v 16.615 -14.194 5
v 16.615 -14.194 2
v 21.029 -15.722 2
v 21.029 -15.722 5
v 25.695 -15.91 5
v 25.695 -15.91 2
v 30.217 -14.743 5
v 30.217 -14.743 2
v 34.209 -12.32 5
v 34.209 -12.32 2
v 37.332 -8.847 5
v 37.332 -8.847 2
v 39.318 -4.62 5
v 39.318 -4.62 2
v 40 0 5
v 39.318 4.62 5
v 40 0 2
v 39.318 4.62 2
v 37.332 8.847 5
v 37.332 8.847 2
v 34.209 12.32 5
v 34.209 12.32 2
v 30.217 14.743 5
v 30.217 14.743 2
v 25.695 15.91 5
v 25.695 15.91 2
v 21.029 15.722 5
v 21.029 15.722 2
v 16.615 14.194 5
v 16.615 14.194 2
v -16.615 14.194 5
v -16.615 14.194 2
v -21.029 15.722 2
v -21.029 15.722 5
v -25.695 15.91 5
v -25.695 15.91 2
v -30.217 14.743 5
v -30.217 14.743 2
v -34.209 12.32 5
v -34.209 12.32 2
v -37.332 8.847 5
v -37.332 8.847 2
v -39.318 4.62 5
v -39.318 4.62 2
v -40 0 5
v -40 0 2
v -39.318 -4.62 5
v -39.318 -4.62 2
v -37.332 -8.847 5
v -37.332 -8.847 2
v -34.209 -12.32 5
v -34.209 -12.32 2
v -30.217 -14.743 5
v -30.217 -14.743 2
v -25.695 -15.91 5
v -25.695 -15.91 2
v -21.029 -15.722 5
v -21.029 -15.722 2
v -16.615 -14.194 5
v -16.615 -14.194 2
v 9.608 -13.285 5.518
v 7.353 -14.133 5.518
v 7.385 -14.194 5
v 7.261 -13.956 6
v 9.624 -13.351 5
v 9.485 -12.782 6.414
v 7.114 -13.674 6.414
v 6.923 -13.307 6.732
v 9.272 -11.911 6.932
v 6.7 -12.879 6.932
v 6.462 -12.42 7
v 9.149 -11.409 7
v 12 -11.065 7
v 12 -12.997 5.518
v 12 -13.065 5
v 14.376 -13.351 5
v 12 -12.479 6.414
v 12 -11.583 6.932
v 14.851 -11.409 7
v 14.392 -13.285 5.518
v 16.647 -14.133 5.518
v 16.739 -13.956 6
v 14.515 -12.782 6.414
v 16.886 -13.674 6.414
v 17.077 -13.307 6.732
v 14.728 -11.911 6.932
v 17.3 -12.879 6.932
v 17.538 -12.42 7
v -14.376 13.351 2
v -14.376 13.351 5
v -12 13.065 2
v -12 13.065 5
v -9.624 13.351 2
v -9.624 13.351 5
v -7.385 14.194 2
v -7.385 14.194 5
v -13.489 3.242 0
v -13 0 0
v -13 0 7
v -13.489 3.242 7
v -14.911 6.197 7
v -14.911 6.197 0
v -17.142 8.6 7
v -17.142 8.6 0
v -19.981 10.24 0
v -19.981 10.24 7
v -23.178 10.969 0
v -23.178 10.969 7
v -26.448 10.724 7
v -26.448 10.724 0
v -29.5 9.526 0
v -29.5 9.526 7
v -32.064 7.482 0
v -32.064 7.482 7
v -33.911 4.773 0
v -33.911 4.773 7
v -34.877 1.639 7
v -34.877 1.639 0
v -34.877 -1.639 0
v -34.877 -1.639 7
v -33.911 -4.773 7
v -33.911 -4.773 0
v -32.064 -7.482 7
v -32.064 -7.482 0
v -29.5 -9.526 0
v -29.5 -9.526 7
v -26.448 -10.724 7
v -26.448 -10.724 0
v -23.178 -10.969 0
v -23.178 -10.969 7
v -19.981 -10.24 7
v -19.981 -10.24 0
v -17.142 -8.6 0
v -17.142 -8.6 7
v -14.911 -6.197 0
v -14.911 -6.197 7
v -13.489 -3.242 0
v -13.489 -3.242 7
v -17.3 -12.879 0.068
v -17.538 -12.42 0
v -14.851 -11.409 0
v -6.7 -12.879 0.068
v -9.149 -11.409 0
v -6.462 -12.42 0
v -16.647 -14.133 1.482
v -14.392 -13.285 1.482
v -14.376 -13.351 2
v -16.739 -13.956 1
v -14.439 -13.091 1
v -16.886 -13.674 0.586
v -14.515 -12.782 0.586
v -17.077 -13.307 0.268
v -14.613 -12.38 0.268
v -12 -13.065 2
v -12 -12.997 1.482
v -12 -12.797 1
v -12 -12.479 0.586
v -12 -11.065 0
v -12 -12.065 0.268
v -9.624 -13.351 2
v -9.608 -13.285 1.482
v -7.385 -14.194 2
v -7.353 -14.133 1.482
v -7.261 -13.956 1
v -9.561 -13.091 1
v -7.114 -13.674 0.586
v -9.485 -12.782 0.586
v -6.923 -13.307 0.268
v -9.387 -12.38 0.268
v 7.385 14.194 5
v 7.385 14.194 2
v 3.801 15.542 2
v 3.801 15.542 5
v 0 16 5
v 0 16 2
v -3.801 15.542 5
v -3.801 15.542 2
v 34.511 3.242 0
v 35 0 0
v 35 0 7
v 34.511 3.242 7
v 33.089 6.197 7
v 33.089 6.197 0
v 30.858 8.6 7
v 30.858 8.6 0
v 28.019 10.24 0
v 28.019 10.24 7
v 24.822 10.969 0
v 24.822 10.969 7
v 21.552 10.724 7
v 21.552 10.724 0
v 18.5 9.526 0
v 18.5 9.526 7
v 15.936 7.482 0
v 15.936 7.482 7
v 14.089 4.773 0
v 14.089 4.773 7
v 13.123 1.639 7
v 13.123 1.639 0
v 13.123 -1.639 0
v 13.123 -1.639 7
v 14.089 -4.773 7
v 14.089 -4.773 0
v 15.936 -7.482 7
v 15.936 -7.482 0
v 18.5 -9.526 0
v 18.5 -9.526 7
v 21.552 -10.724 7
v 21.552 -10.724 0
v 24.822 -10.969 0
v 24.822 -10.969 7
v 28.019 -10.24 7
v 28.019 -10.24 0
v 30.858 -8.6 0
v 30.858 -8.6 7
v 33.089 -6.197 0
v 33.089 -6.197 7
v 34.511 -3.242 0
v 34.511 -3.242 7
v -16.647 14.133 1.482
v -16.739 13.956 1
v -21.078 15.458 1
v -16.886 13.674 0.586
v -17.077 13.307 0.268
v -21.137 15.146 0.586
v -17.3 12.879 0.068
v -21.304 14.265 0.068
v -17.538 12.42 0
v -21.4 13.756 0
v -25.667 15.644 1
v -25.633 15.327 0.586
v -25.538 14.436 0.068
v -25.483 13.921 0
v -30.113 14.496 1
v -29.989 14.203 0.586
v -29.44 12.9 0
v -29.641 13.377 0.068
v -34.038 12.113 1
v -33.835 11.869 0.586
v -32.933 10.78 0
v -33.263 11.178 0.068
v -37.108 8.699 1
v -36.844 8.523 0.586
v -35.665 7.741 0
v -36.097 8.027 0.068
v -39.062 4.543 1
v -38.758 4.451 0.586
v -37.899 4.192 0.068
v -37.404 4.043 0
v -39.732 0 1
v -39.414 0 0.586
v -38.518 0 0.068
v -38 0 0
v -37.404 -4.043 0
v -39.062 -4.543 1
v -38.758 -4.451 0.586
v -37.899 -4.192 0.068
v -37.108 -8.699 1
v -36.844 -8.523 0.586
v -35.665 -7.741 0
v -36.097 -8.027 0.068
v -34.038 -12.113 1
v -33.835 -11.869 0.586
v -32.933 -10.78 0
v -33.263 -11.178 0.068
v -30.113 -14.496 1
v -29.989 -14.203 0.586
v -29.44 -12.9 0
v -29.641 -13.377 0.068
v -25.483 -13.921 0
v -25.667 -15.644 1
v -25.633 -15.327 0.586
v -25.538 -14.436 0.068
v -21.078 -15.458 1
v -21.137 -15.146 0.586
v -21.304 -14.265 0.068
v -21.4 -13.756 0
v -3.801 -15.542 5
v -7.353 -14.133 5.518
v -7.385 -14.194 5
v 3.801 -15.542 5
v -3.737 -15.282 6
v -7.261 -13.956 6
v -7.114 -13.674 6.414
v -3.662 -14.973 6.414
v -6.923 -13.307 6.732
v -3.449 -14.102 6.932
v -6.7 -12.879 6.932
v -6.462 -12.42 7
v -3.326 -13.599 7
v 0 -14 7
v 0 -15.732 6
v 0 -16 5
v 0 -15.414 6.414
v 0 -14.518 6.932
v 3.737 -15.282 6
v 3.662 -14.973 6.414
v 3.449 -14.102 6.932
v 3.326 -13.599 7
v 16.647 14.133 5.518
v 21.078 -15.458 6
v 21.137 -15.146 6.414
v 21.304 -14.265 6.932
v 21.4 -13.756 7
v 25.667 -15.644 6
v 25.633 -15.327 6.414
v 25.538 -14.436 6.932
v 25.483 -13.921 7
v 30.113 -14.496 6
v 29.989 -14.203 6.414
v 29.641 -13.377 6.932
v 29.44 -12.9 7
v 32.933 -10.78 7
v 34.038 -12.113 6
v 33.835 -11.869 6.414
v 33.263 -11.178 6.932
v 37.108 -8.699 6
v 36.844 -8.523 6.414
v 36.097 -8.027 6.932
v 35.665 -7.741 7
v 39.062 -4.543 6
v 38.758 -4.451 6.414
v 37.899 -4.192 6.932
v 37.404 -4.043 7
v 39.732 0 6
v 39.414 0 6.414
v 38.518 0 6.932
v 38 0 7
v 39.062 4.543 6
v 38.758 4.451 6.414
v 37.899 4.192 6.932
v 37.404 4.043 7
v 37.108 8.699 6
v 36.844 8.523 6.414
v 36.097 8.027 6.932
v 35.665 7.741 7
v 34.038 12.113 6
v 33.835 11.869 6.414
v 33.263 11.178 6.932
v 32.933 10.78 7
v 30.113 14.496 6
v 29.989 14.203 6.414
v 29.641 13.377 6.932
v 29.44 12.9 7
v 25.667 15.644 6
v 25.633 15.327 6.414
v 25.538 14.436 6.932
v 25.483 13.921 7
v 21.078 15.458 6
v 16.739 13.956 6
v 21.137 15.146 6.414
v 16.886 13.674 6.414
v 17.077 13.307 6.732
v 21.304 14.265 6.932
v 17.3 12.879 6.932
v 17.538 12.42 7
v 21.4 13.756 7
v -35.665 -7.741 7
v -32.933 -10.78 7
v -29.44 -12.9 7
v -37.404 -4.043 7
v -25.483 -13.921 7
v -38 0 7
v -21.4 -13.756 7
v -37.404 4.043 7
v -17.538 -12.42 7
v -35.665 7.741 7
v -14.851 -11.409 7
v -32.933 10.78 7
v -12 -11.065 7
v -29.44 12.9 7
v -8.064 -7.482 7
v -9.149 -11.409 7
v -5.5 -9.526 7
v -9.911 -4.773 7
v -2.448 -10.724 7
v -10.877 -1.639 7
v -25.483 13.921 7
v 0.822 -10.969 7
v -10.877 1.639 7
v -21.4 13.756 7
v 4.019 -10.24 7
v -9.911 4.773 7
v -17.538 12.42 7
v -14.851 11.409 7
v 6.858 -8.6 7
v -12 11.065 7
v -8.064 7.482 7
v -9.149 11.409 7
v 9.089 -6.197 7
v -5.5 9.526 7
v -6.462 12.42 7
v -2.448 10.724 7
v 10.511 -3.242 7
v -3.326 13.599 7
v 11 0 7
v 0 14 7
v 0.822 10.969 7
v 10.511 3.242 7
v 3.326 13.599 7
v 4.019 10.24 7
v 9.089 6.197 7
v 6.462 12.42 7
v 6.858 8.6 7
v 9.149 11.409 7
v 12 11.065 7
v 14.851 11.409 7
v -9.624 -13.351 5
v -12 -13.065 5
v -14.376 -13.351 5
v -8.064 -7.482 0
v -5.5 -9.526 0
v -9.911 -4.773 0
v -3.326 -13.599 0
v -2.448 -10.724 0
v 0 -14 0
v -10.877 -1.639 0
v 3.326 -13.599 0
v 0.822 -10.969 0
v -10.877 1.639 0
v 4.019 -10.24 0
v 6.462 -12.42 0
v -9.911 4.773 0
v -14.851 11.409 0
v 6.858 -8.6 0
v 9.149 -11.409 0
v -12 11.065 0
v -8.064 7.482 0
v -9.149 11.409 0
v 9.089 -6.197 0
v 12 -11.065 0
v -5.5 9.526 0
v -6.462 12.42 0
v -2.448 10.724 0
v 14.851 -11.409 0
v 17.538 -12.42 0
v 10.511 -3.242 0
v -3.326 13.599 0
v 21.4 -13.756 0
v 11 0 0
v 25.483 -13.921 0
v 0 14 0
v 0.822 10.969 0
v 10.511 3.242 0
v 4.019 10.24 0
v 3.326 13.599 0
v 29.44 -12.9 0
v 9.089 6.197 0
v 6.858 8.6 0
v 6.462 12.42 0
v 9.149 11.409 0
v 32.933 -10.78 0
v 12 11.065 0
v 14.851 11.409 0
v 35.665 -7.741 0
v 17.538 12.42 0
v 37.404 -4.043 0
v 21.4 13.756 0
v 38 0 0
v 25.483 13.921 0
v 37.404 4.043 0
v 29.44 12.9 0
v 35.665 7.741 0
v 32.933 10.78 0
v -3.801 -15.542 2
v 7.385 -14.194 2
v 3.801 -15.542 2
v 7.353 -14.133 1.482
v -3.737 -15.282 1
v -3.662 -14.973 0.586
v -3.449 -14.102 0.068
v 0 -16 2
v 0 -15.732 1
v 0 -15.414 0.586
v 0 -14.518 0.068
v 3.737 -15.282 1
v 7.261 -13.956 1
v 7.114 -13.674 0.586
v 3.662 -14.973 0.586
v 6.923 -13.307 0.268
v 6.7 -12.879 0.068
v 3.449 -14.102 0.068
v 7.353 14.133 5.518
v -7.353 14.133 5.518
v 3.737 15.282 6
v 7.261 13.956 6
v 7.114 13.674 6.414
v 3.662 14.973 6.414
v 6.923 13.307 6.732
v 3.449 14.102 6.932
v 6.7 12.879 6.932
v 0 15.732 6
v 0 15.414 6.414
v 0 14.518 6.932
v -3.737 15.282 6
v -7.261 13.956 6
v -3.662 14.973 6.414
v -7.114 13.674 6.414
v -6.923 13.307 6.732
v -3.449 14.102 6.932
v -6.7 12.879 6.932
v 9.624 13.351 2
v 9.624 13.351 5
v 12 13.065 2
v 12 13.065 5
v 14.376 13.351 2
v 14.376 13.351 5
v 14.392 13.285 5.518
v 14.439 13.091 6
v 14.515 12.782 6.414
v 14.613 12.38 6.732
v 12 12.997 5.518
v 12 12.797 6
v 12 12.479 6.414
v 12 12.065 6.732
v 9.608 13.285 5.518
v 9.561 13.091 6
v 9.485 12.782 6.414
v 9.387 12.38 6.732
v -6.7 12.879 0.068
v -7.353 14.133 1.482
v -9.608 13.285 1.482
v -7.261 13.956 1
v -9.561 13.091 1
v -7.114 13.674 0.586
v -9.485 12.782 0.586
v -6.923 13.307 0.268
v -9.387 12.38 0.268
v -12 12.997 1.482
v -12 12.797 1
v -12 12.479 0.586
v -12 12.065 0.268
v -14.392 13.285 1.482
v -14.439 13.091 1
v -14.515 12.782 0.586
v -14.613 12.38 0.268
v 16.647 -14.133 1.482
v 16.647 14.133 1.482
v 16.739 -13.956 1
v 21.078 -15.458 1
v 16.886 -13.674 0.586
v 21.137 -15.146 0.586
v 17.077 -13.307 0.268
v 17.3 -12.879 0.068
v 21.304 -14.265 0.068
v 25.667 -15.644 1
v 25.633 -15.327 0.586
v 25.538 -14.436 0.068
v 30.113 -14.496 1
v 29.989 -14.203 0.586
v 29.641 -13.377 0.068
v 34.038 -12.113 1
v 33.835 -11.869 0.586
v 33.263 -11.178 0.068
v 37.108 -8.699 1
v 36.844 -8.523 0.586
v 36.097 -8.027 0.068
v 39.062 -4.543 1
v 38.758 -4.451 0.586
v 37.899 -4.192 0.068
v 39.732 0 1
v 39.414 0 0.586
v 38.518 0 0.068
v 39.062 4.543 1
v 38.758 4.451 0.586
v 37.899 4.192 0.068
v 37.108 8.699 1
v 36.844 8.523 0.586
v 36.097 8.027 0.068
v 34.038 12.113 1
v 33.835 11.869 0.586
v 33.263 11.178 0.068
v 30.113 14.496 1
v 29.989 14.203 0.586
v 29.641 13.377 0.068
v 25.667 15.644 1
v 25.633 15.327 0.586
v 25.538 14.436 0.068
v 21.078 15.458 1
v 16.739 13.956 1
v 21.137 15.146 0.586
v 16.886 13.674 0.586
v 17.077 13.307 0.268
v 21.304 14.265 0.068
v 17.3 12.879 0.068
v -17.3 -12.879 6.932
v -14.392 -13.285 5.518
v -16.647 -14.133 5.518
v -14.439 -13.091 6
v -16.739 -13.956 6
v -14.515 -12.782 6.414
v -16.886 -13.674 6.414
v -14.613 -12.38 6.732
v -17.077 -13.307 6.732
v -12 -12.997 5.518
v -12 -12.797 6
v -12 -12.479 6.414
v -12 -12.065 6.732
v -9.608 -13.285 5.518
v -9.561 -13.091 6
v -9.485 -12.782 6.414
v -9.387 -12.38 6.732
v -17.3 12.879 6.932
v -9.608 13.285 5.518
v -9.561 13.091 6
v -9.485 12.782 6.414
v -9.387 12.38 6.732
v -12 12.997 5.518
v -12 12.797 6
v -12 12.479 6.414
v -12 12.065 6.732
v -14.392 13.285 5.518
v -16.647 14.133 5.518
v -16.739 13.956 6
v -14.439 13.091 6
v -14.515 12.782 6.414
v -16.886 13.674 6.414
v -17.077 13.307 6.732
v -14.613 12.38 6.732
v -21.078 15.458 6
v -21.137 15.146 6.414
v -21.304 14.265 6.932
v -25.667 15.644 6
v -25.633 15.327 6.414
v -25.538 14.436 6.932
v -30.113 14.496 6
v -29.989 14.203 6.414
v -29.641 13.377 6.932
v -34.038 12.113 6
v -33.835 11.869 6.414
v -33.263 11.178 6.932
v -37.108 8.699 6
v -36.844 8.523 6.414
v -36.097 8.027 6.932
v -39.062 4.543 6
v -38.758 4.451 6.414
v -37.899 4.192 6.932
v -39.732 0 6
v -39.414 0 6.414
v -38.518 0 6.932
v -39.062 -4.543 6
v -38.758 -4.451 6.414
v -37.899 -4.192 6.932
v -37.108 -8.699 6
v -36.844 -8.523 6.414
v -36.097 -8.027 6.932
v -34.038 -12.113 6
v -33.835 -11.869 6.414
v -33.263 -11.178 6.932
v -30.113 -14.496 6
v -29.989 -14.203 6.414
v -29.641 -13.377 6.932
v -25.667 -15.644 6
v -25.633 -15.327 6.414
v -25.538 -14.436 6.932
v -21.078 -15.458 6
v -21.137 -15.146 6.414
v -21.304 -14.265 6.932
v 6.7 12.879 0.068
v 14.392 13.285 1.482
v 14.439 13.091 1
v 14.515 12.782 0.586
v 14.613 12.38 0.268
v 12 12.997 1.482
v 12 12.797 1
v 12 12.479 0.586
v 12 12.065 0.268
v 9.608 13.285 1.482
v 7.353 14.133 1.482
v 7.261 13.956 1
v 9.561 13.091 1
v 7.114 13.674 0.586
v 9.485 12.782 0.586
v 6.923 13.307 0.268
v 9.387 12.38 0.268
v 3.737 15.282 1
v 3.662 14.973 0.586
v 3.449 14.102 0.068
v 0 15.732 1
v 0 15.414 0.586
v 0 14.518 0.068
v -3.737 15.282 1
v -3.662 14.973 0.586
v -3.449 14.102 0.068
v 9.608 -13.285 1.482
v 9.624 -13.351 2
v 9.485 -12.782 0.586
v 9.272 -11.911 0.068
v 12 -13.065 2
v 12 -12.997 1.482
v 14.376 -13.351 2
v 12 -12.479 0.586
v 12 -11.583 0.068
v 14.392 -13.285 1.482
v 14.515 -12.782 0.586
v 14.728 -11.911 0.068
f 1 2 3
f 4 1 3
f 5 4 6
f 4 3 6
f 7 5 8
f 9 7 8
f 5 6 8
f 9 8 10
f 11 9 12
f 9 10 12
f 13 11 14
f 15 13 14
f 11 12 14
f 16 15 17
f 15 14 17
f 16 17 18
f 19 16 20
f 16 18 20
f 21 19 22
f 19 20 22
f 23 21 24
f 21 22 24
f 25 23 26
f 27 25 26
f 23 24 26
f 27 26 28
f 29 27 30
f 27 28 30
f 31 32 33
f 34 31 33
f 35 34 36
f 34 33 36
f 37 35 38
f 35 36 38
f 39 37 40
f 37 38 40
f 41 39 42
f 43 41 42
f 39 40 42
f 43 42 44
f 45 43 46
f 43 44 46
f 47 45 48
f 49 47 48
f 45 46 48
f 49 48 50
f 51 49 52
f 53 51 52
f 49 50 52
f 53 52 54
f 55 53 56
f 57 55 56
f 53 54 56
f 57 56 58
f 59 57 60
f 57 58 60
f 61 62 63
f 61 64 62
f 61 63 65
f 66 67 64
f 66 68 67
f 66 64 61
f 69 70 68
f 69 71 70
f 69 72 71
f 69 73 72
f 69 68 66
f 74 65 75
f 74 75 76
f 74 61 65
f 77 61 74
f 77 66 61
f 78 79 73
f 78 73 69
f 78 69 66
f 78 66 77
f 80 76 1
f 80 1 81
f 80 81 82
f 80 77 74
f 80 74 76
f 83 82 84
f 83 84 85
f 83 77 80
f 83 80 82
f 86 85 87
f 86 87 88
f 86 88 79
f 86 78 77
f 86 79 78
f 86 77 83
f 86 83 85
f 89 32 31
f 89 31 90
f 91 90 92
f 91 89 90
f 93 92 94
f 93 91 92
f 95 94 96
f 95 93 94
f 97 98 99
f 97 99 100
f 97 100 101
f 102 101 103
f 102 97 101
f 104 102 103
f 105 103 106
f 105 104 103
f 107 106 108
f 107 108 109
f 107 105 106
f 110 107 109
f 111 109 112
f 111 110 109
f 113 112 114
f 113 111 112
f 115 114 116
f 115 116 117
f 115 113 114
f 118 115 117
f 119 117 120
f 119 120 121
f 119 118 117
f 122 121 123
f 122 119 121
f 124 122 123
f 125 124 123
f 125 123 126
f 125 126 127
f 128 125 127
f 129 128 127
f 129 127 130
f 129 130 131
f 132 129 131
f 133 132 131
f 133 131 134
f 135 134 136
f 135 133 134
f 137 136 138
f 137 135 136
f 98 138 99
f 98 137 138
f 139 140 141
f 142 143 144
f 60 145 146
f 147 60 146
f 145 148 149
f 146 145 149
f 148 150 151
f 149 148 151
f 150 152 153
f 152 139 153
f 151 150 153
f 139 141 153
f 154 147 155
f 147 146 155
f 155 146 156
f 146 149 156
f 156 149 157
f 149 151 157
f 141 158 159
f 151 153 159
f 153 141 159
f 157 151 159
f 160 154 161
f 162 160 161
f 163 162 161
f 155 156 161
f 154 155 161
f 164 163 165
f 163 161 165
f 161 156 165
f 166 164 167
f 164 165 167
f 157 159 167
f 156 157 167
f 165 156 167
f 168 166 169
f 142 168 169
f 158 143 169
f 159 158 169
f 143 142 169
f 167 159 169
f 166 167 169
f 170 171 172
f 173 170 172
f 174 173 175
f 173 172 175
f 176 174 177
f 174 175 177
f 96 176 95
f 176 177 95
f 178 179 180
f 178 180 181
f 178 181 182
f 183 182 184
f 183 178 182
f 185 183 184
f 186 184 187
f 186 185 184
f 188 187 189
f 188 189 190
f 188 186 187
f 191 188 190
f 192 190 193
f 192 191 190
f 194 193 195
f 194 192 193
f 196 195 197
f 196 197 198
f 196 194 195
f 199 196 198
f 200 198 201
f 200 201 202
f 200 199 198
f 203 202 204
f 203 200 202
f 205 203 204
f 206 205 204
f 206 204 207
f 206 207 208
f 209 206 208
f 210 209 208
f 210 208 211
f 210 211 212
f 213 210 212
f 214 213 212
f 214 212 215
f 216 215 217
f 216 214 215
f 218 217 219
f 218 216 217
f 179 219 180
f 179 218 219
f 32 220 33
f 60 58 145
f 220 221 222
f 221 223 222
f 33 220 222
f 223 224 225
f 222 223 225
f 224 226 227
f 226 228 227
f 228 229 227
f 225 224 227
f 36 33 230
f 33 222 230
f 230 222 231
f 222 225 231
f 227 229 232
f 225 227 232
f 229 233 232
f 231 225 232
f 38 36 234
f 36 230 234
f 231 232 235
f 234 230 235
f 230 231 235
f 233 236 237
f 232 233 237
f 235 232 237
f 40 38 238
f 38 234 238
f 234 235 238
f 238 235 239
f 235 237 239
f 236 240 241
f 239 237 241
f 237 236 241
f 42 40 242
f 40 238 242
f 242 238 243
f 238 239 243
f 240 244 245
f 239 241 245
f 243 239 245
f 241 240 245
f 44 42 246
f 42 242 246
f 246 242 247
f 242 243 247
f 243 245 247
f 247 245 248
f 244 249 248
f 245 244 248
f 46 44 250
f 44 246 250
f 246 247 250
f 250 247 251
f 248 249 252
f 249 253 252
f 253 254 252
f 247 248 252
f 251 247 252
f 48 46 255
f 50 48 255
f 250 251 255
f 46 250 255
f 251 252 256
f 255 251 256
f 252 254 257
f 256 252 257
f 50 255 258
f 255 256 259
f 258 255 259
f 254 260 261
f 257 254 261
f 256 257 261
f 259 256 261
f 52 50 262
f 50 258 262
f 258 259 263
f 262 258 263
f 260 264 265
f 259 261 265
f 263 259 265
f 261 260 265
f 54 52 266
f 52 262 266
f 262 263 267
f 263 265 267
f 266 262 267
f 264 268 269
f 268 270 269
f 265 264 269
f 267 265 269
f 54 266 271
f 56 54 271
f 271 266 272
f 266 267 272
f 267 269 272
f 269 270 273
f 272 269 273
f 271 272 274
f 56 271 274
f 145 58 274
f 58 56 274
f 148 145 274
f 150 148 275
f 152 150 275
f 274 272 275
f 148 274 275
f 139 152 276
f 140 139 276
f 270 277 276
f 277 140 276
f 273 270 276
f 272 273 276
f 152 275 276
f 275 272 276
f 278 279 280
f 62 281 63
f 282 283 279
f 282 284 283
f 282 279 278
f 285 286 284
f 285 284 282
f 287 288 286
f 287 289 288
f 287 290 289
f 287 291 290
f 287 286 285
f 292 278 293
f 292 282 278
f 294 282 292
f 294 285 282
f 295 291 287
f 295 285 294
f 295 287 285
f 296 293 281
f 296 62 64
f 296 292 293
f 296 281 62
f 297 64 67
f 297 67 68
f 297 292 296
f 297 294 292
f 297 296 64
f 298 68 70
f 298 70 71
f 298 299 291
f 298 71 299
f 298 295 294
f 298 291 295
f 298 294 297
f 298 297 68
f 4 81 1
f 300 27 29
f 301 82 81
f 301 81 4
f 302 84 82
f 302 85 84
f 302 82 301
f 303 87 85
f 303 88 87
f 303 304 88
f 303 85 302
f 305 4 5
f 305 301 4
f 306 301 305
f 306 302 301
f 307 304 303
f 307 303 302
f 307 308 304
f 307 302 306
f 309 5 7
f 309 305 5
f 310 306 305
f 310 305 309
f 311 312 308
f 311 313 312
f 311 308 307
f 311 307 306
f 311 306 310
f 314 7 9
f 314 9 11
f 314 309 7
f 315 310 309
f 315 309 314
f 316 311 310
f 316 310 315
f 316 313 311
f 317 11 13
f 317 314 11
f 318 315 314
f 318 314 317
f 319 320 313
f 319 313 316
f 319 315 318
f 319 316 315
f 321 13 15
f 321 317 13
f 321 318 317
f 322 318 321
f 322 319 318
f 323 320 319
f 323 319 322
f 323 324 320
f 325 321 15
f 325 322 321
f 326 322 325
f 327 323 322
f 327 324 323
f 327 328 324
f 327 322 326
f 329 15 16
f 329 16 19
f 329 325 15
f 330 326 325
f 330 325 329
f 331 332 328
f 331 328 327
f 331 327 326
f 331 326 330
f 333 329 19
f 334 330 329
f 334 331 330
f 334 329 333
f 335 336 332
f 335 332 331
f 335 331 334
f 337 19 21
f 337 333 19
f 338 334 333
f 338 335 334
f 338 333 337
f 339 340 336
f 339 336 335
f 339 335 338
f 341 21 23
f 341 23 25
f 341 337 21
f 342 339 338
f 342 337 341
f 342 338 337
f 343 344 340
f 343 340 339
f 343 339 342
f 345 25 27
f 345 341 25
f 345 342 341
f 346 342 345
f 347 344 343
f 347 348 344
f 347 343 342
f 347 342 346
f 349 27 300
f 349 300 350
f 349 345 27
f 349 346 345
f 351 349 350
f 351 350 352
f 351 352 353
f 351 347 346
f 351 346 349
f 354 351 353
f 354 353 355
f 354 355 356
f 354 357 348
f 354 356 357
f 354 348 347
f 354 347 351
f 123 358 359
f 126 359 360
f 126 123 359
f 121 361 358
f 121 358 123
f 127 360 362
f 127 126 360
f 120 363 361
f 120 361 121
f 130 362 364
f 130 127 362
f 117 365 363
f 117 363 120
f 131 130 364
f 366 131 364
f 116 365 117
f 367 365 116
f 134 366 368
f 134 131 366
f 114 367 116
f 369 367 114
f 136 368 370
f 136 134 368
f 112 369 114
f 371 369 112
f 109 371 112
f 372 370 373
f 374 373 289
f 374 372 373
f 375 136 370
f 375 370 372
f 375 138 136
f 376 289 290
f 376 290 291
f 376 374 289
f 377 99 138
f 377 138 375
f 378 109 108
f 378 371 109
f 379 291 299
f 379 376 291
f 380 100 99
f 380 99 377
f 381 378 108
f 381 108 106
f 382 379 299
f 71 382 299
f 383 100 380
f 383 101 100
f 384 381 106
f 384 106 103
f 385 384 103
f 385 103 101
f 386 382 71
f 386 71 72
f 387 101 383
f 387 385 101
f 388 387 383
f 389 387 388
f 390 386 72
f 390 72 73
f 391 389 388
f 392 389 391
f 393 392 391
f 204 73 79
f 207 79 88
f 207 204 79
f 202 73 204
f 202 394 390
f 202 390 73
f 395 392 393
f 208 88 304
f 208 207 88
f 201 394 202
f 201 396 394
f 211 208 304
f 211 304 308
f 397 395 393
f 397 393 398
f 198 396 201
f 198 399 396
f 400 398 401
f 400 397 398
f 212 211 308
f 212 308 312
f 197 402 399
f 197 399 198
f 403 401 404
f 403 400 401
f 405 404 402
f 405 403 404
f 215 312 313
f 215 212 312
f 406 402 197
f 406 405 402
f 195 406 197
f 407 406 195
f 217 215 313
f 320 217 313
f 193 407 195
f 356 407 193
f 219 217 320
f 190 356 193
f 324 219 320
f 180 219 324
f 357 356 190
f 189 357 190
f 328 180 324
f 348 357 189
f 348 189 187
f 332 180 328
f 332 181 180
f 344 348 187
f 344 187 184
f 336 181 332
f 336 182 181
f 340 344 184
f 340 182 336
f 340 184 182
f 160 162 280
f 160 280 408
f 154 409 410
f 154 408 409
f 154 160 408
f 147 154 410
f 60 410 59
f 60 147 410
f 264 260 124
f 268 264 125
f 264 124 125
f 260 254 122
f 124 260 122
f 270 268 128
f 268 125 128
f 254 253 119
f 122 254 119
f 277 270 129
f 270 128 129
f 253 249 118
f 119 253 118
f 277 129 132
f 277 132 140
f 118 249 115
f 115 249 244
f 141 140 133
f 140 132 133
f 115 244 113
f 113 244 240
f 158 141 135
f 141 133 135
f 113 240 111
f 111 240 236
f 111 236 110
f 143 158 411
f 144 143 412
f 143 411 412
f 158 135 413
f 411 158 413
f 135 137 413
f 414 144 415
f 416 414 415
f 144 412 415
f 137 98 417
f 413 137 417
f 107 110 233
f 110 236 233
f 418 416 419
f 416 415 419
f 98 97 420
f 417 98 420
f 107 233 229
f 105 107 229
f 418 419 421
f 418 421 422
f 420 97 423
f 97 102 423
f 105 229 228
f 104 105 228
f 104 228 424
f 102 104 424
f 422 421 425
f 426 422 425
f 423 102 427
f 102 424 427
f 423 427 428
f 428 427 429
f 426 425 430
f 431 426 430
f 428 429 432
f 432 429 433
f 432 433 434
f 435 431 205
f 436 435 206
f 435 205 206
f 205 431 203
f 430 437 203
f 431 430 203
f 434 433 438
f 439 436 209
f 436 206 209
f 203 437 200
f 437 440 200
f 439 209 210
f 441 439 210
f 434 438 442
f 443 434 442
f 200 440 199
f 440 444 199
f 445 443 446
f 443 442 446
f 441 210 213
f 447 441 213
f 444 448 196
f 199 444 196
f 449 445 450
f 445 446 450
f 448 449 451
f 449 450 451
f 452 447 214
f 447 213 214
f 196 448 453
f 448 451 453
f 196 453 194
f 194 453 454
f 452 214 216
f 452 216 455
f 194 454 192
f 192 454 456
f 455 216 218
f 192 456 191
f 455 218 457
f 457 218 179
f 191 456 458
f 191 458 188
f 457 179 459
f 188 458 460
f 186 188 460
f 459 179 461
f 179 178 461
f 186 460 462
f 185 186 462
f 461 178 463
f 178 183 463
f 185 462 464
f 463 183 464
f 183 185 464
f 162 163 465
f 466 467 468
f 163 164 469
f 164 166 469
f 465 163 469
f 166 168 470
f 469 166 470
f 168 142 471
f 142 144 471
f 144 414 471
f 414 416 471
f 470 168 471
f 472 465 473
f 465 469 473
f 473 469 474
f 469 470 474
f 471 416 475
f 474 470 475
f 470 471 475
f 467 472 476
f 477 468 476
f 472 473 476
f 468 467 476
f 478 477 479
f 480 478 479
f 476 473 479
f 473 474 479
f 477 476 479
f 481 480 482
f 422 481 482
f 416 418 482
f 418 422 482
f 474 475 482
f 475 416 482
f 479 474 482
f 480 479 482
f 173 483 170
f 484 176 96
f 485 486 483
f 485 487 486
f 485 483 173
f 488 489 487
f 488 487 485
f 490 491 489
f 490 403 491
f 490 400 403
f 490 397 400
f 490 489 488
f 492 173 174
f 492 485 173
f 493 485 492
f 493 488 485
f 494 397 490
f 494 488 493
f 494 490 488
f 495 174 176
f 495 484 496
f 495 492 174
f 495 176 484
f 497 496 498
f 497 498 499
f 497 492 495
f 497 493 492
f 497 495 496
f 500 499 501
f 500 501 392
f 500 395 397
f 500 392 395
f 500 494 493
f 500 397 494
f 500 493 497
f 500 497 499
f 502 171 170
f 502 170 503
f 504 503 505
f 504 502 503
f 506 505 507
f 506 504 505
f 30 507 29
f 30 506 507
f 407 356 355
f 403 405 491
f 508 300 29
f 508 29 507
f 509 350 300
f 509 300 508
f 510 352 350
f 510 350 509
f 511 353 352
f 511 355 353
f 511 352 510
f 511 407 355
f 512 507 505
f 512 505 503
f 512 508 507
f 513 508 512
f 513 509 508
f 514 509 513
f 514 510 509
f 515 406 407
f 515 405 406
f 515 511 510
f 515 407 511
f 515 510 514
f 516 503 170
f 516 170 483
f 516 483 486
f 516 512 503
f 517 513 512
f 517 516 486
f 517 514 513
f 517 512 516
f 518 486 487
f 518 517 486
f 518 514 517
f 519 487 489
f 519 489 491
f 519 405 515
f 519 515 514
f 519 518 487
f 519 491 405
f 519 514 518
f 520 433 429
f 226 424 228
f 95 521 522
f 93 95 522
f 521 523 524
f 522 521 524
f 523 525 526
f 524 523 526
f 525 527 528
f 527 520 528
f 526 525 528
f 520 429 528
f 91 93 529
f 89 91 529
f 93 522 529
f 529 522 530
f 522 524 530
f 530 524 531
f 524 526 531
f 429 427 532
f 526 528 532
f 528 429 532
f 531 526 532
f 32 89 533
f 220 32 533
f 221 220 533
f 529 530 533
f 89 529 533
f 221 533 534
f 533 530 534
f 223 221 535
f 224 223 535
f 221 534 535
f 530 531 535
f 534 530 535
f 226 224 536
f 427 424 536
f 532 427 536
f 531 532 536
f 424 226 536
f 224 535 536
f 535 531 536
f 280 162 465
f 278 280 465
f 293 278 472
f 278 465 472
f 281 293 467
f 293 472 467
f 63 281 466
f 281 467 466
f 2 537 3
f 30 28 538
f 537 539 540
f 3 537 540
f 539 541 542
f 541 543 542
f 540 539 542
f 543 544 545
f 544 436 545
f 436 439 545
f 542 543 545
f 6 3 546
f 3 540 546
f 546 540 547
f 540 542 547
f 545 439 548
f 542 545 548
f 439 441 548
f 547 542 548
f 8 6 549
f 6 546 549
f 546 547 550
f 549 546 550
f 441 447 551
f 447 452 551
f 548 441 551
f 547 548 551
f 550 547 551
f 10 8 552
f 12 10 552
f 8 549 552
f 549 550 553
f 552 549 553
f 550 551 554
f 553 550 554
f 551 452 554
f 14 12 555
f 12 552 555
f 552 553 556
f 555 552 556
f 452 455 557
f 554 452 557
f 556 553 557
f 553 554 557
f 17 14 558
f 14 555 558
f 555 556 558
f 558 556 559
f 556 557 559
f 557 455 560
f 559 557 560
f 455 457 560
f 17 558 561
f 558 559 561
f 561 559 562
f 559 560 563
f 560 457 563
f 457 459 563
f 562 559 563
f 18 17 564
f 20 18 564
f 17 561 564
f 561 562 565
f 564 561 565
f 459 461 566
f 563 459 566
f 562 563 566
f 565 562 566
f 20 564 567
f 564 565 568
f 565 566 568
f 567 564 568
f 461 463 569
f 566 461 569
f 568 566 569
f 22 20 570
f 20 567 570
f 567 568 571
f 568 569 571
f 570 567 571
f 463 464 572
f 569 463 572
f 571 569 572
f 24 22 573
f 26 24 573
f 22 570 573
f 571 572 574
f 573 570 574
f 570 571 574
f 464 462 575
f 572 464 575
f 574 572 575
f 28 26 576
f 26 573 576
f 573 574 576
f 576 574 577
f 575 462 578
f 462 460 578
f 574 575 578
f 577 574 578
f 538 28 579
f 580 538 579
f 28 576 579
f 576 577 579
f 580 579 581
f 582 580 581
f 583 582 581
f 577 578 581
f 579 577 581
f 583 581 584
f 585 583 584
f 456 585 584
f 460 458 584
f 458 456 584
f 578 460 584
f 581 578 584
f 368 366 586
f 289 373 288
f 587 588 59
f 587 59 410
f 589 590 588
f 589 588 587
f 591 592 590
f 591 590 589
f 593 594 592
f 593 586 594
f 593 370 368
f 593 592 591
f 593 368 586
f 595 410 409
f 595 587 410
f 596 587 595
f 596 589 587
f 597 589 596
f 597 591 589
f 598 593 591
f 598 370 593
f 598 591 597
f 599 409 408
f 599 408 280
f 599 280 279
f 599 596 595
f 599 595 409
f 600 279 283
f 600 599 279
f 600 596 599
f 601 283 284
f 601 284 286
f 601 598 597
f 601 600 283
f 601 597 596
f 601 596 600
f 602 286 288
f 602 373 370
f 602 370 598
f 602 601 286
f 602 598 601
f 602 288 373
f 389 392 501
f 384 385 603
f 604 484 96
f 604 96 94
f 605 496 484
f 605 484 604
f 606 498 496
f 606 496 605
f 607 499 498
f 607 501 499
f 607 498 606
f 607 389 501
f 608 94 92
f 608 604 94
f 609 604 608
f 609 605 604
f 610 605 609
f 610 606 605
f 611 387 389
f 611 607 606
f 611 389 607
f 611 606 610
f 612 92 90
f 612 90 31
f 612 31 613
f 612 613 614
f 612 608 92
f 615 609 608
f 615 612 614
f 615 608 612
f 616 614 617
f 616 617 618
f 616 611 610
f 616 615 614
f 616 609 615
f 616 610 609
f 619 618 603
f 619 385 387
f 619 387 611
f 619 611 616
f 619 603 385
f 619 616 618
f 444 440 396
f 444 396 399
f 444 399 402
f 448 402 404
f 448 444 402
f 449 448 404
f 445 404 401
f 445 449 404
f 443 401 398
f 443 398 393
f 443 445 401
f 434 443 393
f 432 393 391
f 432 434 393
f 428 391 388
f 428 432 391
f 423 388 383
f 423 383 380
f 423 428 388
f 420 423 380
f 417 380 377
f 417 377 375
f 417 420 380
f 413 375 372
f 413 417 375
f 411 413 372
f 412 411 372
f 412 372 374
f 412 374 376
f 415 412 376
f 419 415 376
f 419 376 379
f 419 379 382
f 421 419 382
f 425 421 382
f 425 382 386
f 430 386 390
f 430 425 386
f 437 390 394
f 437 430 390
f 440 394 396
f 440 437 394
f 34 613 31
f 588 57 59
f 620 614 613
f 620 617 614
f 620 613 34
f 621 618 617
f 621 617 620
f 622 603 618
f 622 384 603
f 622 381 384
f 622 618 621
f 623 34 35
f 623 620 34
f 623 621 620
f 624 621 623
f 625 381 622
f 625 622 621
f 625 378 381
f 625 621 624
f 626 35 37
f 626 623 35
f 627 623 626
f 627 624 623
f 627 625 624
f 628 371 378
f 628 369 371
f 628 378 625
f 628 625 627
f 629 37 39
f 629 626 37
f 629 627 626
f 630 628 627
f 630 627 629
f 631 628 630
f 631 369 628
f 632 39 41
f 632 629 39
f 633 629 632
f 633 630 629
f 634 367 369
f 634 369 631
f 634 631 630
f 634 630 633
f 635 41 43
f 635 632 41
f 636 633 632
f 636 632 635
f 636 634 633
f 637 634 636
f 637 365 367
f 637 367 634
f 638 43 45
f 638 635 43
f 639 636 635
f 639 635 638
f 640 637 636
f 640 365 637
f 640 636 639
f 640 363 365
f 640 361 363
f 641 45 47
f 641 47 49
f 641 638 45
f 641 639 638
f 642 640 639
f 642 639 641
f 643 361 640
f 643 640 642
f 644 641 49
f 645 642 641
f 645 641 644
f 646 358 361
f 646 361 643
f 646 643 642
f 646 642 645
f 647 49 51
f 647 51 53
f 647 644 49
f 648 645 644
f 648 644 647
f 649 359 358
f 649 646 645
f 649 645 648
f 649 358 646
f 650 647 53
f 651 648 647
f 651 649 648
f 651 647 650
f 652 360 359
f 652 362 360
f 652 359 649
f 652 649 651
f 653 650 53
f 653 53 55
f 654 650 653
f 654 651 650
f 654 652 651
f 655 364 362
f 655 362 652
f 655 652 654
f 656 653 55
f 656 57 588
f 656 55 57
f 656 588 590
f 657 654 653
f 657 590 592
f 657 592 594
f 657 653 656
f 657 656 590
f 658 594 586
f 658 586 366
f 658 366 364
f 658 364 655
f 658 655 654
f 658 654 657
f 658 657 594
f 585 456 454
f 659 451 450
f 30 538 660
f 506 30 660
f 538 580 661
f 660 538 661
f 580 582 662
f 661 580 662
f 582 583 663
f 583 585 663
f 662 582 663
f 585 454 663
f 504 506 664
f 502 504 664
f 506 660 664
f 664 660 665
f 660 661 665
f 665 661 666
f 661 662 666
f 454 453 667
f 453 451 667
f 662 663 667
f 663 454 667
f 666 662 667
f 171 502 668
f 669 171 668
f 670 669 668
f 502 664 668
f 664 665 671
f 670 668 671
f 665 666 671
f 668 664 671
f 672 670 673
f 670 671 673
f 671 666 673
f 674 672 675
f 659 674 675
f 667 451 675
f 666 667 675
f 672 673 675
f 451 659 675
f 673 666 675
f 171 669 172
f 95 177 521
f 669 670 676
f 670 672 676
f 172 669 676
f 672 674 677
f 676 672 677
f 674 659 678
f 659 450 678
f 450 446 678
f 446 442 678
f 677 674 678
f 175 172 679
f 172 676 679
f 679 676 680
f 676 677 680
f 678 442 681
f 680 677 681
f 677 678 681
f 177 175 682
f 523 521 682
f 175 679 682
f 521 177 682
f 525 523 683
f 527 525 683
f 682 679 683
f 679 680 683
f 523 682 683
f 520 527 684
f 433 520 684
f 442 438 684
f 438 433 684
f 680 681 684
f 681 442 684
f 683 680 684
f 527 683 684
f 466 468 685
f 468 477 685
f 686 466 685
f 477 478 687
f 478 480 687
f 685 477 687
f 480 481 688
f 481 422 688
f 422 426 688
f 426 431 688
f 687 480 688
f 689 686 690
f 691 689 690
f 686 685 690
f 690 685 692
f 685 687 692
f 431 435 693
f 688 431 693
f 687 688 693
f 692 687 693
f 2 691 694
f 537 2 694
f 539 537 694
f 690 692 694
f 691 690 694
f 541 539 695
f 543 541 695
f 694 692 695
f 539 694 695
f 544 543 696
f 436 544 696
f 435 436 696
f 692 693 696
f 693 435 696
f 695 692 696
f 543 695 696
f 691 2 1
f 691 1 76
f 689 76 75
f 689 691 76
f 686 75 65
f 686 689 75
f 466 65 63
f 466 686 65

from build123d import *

# Parameters (mm, degrees)
SKETCH_R  = 11
PAD_DEPTH = 7
FILLET_R  = 2


with BuildPart() as part:
    # Sketch → Pad (new body)
    with BuildSketch(Plane.XY):
        with BuildLine():
            ThreePointArc((-7.384634, -14.193914), (0, -16), (7.384634, -14.193914))
            ThreePointArc((16.615361, -14.193911), (11.999997, -13.065125), (7.384634, -14.193914))
            ThreePointArc((16.615361, -14.193911), (40, 0), (16.615361, 14.193911))
            ThreePointArc((7.384634, 14.193914), (11.999997, 13.065125), (16.615361, 14.193911))
            ThreePointArc((7.384634, 14.193914), (0, 16), (-7.384634, 14.193914))
            ThreePointArc((-16.615359, 14.19391), (-11.999996, 13.065125), (-7.384634, 14.193914))
            ThreePointArc((-16.615359, 14.19391), (-40, 2e-06), (-16.615362, -14.193912))
            ThreePointArc((-7.384634, -14.193914), (-11.999998, -13.065125), (-16.615362, -14.193912))
        make_face()
        with Locations((-24, 0)):
            Circle(SKETCH_R, mode=Mode.SUBTRACT)
        Circle(SKETCH_R, mode=Mode.SUBTRACT)
        with Locations((24, 0)):
            Circle(SKETCH_R, mode=Mode.SUBTRACT)
    extrude(amount=PAD_DEPTH)

    # Fillet
    fillet_edges = [part.edges().sort_by_distance(p)[0] for p in [
        (40, 0, 0),
        (40, 0, 7),
    ]]
    fillet(fillet_edges, radius=FILLET_R)


solid = part.part
